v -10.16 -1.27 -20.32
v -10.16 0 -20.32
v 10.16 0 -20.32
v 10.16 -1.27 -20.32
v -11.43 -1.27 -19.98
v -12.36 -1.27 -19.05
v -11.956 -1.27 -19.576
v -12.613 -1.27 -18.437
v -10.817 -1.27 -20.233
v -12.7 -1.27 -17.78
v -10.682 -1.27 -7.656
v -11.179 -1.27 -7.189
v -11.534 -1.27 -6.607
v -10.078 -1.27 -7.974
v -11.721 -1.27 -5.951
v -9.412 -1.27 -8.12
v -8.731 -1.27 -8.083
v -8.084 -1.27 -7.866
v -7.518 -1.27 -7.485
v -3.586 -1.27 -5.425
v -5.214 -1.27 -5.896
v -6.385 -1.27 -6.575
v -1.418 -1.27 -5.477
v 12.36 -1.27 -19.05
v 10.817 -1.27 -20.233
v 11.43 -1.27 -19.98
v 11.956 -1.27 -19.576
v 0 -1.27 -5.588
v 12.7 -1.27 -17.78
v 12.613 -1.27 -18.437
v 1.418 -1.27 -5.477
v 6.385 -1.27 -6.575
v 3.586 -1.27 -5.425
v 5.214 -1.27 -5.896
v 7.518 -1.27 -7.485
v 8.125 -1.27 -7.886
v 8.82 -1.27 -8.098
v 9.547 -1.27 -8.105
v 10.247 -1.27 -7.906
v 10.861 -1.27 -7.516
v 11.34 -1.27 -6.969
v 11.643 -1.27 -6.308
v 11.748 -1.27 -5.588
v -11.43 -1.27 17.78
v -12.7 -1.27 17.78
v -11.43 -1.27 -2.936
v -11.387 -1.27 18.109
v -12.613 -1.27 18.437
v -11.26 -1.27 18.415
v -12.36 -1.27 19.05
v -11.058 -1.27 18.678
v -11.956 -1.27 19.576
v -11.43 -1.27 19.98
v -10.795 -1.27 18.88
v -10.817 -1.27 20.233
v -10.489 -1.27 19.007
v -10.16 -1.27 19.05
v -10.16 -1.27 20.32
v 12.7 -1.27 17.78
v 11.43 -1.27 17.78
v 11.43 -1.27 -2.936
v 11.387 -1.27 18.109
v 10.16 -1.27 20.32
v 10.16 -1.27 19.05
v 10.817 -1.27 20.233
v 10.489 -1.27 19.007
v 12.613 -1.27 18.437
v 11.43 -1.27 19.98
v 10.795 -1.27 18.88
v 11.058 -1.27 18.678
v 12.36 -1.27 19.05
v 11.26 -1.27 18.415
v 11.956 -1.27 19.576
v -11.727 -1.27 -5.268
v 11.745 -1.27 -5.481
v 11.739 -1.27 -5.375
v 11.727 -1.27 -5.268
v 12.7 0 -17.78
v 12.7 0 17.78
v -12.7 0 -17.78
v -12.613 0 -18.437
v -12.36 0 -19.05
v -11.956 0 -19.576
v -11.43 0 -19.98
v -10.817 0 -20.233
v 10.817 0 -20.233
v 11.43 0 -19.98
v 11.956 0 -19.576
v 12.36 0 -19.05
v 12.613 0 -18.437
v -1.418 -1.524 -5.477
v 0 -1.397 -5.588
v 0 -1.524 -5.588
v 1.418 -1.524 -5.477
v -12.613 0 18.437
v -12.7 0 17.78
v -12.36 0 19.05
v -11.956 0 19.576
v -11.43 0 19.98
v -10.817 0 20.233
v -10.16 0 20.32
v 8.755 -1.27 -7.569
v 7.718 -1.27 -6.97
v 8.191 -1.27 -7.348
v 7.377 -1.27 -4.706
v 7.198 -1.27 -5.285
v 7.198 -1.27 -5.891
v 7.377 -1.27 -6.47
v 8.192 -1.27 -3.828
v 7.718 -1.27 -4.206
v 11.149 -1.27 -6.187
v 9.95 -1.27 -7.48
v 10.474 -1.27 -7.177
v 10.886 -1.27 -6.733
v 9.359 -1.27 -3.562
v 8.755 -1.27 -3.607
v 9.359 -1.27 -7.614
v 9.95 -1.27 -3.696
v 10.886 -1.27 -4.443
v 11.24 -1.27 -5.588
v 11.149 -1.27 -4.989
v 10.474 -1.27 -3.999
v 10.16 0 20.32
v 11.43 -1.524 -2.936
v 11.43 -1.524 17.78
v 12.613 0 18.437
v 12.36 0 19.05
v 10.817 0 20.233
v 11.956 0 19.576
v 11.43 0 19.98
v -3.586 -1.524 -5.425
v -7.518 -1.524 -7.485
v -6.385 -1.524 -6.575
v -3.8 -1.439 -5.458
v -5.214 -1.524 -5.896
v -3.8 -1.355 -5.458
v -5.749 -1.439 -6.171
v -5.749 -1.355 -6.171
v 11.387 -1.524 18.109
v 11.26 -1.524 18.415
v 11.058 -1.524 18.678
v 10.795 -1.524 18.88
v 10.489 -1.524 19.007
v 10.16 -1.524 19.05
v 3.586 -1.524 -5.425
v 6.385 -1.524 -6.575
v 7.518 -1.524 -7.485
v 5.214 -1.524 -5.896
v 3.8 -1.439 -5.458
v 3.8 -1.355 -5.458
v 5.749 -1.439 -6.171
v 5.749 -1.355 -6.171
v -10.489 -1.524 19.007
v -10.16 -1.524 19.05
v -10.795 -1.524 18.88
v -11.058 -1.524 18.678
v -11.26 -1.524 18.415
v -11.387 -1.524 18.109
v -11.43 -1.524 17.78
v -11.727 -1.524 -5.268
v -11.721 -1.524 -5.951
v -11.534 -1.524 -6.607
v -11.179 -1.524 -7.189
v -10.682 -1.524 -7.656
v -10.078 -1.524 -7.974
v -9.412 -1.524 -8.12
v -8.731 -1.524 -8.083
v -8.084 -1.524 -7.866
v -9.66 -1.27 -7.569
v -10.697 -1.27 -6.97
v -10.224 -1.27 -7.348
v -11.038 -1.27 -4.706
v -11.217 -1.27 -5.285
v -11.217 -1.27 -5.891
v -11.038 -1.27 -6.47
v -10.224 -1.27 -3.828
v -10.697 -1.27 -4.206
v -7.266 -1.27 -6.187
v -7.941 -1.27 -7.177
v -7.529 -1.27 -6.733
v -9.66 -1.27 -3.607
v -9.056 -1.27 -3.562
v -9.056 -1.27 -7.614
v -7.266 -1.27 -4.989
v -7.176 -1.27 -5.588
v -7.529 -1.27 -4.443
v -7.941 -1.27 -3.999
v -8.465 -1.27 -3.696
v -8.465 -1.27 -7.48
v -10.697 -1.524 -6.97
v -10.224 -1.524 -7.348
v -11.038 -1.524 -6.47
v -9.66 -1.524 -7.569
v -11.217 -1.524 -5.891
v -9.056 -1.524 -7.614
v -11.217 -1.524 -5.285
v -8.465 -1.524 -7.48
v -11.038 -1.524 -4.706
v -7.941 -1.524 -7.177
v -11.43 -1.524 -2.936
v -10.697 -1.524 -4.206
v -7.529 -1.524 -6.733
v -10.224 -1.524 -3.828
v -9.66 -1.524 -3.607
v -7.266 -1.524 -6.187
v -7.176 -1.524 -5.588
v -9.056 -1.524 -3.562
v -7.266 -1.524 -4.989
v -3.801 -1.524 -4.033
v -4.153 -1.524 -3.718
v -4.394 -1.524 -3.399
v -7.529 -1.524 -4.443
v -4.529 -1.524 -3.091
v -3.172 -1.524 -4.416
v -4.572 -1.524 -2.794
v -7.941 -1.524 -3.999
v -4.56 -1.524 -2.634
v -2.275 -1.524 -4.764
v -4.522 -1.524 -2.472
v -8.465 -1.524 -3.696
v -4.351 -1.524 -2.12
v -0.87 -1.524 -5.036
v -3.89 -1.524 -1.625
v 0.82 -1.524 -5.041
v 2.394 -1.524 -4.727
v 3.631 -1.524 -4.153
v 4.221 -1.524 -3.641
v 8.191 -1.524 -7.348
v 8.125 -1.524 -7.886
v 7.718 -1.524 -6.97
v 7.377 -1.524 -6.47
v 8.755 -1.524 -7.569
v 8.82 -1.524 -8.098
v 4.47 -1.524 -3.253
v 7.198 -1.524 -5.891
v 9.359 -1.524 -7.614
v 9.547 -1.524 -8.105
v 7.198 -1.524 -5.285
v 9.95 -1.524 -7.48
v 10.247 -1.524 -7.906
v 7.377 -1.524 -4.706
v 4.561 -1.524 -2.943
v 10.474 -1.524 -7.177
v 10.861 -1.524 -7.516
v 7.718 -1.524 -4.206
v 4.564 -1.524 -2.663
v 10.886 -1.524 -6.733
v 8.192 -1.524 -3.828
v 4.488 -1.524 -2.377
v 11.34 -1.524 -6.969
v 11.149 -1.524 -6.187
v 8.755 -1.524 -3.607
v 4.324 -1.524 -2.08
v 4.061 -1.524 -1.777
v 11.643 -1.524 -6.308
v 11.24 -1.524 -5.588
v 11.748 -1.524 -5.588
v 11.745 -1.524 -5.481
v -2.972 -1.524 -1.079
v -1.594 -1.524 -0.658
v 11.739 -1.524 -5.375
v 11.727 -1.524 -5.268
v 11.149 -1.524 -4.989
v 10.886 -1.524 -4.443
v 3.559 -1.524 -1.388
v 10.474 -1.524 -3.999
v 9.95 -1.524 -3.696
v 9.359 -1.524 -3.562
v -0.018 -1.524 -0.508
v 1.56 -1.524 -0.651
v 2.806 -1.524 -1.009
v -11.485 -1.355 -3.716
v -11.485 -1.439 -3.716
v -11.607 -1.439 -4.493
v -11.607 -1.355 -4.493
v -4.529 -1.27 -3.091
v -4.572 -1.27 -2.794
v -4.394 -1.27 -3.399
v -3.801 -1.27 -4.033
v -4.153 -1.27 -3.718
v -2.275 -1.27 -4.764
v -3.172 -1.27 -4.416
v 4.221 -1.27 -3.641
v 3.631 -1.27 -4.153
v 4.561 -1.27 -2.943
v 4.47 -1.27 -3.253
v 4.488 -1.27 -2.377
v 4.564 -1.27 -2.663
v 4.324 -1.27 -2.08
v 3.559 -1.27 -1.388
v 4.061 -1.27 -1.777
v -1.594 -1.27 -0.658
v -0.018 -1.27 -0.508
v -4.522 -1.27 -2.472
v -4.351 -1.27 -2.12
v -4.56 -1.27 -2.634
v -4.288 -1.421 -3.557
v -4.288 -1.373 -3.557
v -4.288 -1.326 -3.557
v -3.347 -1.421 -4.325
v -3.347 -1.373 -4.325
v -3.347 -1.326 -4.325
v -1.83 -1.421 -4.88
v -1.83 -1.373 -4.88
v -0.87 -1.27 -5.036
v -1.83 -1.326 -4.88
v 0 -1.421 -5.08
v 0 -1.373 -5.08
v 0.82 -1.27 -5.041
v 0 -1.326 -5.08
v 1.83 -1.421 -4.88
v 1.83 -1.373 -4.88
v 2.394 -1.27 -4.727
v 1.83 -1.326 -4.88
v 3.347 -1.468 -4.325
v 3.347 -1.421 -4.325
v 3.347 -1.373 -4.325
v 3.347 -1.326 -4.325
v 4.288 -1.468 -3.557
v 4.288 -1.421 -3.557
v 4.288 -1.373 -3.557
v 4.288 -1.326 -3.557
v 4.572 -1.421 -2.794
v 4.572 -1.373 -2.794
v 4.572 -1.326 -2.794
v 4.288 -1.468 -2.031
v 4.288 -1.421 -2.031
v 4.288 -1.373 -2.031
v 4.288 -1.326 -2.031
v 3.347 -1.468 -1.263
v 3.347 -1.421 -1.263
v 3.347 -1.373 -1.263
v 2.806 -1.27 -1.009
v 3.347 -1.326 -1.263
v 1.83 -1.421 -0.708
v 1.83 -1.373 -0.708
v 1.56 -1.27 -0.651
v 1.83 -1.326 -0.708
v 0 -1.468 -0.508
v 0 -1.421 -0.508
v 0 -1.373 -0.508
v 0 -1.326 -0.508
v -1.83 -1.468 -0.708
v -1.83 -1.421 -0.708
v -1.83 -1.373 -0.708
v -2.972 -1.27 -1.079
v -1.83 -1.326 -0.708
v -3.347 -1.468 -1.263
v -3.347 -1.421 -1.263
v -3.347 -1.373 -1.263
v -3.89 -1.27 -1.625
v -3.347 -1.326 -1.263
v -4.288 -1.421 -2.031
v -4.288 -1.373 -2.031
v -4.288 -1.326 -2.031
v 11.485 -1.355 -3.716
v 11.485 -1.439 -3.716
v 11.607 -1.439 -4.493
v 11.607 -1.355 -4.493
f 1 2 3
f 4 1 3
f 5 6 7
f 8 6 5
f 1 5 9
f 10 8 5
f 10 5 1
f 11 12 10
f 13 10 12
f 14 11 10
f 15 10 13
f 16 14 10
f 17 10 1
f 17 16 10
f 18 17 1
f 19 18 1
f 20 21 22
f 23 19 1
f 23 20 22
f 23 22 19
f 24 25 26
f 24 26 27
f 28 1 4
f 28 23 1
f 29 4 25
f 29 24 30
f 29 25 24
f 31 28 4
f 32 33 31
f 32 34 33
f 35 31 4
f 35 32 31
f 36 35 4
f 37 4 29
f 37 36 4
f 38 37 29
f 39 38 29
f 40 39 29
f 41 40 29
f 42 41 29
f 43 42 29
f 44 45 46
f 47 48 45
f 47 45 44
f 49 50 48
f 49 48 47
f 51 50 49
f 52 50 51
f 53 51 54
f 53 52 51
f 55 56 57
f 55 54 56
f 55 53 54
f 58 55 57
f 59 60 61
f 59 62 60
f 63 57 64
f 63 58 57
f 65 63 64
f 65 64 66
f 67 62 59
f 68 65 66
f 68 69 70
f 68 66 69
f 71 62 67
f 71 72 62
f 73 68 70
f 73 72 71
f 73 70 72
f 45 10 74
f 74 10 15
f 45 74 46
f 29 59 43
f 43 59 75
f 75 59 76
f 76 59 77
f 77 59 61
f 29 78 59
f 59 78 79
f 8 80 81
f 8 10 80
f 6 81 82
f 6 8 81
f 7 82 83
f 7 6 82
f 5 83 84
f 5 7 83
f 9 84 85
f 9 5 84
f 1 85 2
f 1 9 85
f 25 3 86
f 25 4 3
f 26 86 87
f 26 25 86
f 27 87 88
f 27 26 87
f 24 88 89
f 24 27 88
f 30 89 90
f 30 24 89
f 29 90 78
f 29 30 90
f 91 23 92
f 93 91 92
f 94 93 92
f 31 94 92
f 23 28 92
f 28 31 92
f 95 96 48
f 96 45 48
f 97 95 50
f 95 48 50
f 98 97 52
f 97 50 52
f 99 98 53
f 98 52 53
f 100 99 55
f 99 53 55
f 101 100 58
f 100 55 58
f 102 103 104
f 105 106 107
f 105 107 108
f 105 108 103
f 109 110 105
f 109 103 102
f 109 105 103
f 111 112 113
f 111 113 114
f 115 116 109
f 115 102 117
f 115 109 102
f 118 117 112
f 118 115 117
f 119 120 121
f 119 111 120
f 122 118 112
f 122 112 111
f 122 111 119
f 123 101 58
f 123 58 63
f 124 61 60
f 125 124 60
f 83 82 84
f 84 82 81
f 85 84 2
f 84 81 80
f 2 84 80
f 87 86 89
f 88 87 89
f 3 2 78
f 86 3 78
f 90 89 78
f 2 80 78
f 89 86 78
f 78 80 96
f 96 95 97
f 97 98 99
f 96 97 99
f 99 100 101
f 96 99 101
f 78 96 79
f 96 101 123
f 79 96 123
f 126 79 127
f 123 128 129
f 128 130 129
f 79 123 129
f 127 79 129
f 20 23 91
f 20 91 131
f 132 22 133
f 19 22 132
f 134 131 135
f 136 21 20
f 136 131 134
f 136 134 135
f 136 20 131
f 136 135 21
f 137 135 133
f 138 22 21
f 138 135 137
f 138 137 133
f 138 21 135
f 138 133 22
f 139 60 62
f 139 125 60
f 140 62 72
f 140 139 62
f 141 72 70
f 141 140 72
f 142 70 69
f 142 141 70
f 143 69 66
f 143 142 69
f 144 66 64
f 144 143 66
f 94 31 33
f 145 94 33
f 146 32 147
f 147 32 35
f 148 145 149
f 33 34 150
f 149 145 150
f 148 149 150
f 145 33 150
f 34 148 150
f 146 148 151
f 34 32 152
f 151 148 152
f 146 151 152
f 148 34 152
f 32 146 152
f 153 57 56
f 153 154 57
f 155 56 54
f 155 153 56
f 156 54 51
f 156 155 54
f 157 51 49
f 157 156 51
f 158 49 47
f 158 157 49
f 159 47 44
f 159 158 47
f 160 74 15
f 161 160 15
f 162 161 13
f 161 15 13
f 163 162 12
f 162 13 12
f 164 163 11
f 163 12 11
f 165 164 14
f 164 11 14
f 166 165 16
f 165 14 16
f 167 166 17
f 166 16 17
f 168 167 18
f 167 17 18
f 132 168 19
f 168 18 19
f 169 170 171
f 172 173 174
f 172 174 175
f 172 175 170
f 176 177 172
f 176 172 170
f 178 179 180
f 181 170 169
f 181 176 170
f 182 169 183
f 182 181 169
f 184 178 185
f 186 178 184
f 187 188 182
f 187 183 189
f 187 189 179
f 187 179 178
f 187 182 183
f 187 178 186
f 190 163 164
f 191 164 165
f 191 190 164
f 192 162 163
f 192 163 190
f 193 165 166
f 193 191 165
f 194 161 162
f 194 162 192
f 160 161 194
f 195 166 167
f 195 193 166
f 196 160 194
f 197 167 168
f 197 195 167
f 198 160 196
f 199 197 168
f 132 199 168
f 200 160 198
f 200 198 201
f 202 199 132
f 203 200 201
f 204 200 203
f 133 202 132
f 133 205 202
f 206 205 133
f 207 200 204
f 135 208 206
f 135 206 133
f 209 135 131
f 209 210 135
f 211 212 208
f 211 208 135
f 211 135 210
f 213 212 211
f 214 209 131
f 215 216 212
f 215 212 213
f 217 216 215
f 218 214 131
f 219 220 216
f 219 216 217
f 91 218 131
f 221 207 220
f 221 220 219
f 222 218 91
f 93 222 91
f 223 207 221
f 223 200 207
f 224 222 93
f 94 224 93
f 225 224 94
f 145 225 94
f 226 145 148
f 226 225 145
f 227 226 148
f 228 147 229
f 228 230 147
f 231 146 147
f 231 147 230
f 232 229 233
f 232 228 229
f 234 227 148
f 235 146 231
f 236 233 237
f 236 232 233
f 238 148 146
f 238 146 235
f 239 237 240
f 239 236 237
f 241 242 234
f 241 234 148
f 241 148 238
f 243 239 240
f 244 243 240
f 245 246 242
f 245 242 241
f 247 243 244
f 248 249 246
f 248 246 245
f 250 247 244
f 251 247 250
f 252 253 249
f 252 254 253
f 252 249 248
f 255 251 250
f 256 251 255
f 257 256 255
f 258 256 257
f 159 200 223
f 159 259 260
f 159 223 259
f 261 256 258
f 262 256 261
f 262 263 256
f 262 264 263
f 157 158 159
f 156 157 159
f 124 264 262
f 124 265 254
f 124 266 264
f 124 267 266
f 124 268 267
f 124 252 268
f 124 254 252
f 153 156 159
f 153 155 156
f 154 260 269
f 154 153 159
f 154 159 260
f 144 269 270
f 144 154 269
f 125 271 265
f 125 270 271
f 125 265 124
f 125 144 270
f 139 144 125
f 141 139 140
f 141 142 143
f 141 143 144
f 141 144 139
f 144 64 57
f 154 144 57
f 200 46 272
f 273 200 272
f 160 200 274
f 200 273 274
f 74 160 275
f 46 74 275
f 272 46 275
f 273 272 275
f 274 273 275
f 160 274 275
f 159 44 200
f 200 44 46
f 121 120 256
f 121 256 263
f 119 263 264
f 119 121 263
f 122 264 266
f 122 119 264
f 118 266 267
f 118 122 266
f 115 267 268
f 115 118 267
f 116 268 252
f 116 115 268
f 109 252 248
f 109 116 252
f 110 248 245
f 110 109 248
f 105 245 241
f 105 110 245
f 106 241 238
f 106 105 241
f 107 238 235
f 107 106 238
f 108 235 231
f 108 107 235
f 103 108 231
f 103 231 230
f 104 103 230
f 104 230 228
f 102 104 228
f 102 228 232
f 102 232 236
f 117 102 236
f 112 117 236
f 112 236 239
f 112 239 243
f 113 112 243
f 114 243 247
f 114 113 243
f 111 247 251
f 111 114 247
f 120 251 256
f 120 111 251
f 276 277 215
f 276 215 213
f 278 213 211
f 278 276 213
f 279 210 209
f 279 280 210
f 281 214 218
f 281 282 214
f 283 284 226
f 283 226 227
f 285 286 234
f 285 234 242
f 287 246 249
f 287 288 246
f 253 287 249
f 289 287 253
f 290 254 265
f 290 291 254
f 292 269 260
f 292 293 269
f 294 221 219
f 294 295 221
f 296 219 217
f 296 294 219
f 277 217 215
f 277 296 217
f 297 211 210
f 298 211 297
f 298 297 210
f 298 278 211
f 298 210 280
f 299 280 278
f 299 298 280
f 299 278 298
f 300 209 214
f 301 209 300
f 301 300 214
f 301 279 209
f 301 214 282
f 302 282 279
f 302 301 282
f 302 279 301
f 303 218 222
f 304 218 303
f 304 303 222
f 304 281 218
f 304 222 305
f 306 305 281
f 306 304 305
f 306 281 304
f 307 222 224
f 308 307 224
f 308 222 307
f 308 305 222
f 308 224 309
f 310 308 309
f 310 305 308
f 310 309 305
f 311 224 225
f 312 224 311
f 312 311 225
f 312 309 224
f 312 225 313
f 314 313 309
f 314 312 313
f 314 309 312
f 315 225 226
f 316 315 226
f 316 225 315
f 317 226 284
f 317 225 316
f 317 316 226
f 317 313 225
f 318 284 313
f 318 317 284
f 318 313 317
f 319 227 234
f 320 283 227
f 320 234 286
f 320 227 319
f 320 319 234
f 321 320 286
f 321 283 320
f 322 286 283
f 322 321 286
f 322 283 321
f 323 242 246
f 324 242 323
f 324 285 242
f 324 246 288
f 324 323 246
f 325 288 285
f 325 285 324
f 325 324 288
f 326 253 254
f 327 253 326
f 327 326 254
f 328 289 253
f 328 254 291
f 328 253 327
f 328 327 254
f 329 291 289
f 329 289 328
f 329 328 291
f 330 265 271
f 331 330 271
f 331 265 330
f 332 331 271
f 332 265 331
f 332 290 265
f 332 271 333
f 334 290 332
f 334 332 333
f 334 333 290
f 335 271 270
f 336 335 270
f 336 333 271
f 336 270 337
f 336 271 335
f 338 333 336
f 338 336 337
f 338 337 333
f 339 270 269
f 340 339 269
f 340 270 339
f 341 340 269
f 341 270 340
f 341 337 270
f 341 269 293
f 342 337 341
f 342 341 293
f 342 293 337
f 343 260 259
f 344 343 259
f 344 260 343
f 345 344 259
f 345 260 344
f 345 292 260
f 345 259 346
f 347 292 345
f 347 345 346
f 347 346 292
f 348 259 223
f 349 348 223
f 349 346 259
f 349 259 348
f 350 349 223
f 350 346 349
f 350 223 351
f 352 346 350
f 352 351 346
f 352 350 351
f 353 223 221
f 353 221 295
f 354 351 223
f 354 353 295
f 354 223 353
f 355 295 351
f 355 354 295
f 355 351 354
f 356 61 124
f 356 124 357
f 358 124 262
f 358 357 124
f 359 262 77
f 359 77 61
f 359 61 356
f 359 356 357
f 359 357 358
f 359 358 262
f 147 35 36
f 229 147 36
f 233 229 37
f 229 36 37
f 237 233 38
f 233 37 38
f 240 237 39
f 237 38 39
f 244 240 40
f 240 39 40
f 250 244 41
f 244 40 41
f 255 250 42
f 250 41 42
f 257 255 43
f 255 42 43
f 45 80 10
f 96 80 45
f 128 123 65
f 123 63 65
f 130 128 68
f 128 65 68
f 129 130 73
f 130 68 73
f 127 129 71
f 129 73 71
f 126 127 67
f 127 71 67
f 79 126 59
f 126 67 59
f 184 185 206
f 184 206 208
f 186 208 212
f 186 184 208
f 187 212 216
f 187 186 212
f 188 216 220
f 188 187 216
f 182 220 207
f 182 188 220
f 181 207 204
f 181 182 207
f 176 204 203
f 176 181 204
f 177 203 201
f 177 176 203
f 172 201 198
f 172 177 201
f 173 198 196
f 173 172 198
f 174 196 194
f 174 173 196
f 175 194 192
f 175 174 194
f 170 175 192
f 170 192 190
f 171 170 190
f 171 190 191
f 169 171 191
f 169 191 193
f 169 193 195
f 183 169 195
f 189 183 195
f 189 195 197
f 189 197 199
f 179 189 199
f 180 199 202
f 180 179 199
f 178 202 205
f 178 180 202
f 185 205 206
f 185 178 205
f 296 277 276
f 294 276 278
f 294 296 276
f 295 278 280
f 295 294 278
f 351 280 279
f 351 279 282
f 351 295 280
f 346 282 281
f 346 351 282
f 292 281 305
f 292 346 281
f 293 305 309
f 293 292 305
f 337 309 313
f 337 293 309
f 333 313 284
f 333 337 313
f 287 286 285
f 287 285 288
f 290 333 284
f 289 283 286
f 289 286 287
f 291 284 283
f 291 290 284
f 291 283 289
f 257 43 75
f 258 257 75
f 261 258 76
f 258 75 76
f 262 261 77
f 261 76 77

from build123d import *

# Parameters (mm, degrees)
F0_W     = 25.4
F0_H     = 40.64
F1_DEPTH = 1.27
F2_R     = 2.032
F3_DEPTH = 0.254
F4_R     = 2.54
F5_R     = 1.27


# Not quite as in the source:
# - the dataset's text gives a spline's control points without its knots; the knots are read off the source's solid


with BuildPart() as f1:
    # F0 (on Front) → F1 (new body)
    with BuildSketch(Plane.XZ):
        Rectangle(F0_W, F0_H)
    extrude(amount=F1_DEPTH)

    # F2 (on face) → F3 (join)
    with BuildSketch(Plane.XZ.offset(1.27)):
        with BuildLine():
            ThreePointArc((-7.5180080999, -7.4846331009), (-6.8898600985, -6.6273003834), (-6.6675, -5.588))
            ThreePointArc((-6.6675, -5.588), (-9.0473495717, -3.0530538782), (-11.7273045987, -5.268336451))
            ThreePointArc((-11.7273045987, -5.268336451), (-10.3908627949, -7.8354991648), (-7.5180080999, -7.4846331009))
        make_face()
        with Locations((-9.2075, -5.588)):
            Circle(F2_R, mode=Mode.SUBTRACT)
        with BuildLine():
            ThreePointArc((-11.7273045987, -5.268336451), (-9.0473495717, -3.0530538782), (-6.6675, -5.588))
            ThreePointArc((-6.6675, -5.588), (-6.8898600985, -6.6273003834), (-7.5180080999, -7.4846331009))
            add(Edge.make_bspline(
                [(-1.4182194217, -5.4769095653), (-4.1012740694, -5.0478749908), (-5.7548377663, -5.9140278026), (-7.5180080999, -7.4846331009)],
                knots=[0, 0, 0, 0, 6.4217112762, 6.4217112762, 6.4217112762, 6.4217112762], degree=3))
            add(Edge.make_bspline(
                [(-5.08, -2.794), (-5.08, -4.8913715579), (-1.4182194217, -5.4769095653)],
                knots=[3.1415926536, 3.1415926536, 3.1415926536, 4.4294520022, 4.4294520022, 4.4294520022], degree=2, weights=[1, 0.7997427872, 1]))
            add(Edge.make_bspline(
                [(5.08, -2.794), (5.08, 0), (0, 0), (-5.08, 0), (-5.08, -2.794)],
                knots=[0, 0, 0, 1.5707963268, 1.5707963268, 3.1415926536, 3.1415926536, 3.1415926536], degree=2, weights=[1, 0.7071067812, 1, 0.7071067812, 1]))
            add(Edge.make_bspline(
                [(1.4182194217, -5.4769095653), (5.08, -4.8913715579), (5.08, -2.794)],
                knots=[4.9953259586, 4.9953259586, 4.9953259586, 6.2831853072, 6.2831853072, 6.2831853072], degree=2, weights=[1, 0.7997427872, 1]))
            add(Edge.make_bspline(
                [(1.4182194217, -5.4769095653), (4.1012740694, -5.0478749908), (5.7548377663, -5.9140278026), (7.5180080999, -7.4846331009)],
                knots=[0, 0, 0, 0, 6.4217112762, 6.4217112762, 6.4217112762, 6.4217112762], degree=3))
            ThreePointArc((7.5180080999, -7.4846331009), (8.0241372051, -3.3405008352), (11.7273045987, -5.268336451))
            add(Edge.make_bspline(
                [(11.43, -2.9357403982), (11.43, -3.7171181073), (11.6289668146, -4.4931714335), (11.7273045987, -5.268336451)],
                knots=[0, 0, 0, 0, 2.3514664297, 2.3514664297, 2.3514664297, 2.3514664297], degree=3))
            Line((11.43, -2.9357403982), (11.43, 19.05))
            Line((11.43, 19.05), (-11.43, 19.05))
            Line((-11.43, 19.05), (-11.43, -2.9357403982))
            add(Edge.make_bspline(
                [(-11.43, -2.9357403982), (-11.43, -3.7171181073), (-11.6289668146, -4.4931714335), (-11.7273045987, -5.268336451)],
                knots=[0, 0, 0, 0, 2.3514664297, 2.3514664297, 2.3514664297, 2.3514664297], degree=3))
        make_face()
        with BuildLine():
            add(Edge.make_bspline(
                [(-5.08, -2.794), (-5.08, -4.8913715579), (-1.4182194217, -5.4769095653)],
                knots=[3.1415926536, 3.1415926536, 3.1415926536, 4.4294520022, 4.4294520022, 4.4294520022], degree=2, weights=[1, 0.7997427872, 1]))
            add(Edge.make_bspline(
                [(-1.4182194217, -5.4769095653), (0, -5.7036903231), (1.4182194217, -5.4769095653)],
                knots=[4.4294520022, 4.4294520022, 4.4294520022, 4.9953259586, 4.9953259586, 4.9953259586], degree=2, weights=[1, 0.960239644, 1]))
            add(Edge.make_bspline(
                [(1.4182194217, -5.4769095653), (5.08, -4.8913715579), (5.08, -2.794)],
                knots=[4.9953259586, 4.9953259586, 4.9953259586, 6.2831853072, 6.2831853072, 6.2831853072], degree=2, weights=[1, 0.7997427872, 1]))
            add(Edge.make_bspline(
                [(5.08, -2.794), (5.08, 0), (0, 0), (-5.08, 0), (-5.08, -2.794)],
                knots=[0, 0, 0, 1.5707963268, 1.5707963268, 3.1415926536, 3.1415926536, 3.1415926536], degree=2, weights=[1, 0.7071067812, 1, 0.7071067812, 1]))
        make_face()
        with BuildLine():
            add(Edge.make_bspline(
                [(-4.572, -2.794), (-4.572, -2.9169028513), (-4.5290705478, -3.1627085538), (-4.3175460933, -3.5550013791), (-3.9283471819, -3.9595979757), (-3.3716681218, -4.3337764728), (-2.6686840163, -4.6525156626), (-1.8416721788, -4.8959053951), (-0.9445084224, -5.0455757275), (0, -5.0972121363), (0.9445084224, -5.0455757275), (1.8416721788, -4.8959053951), (2.6686840163, -4.6525156626), (3.3716681218, -4.3337764728), (3.9283471819, -3.9595979757), (4.3175460933, -3.5550013791), (4.5290705478, -3.1627085538), (4.5934647261, -2.794), (4.5290705478, -2.4252914462), (4.3175460933, -2.0329986209), (3.9283471819, -1.6284020243), (3.3716681218, -1.2542235272), (2.6686840163, -0.9354843374), (1.8416721788, -0.6920946049), (0.9445084224, -0.5424242725), (0, -0.4907878637), (-0.9445084224, -0.5424242725), (-1.8416721788, -0.6920946049), (-2.6686840163, -0.9354843374), (-3.3716681218, -1.2542235272), (-3.9283471819, -1.6284020243), (-4.3175460933, -2.0329986209), (-4.5290705478, -2.4252914462), (-4.572, -2.6710971487), (-4.572, -2.794)],
                knots=[0, 0, 0, 0, 0.03125, 0.0625, 0.09375, 0.125, 0.15625, 0.1875, 0.21875, 0.25, 0.28125, 0.3125, 0.34375, 0.375, 0.40625, 0.4375, 0.46875, 0.5, 0.53125, 0.5625, 0.59375, 0.625, 0.65625, 0.6875, 0.71875, 0.75, 0.78125, 0.8125, 0.84375, 0.875, 0.90625, 0.9375, 0.96875, 1, 1, 1, 1], degree=3))
        make_face(mode=Mode.SUBTRACT)
        with BuildLine():
            ThreePointArc((11.7273045987, -5.268336451), (8.0241372051, -3.3405008352), (7.5180080999, -7.4846331009))
            ThreePointArc((7.5180080999, -7.4846331009), (10.2468003834, -7.9056399015), (11.7475, -5.588))
            ThreePointArc((11.7475, -5.588), (11.7424461218, -5.4278495717), (11.7273045987, -5.268336451))
        make_face()
        with Locations((9.2075, -5.588)):
            Circle(F2_R, mode=Mode.SUBTRACT)
    extrude(amount=F3_DEPTH)

    # F4
    f4_edges = [f1.edges().sort_by_distance(p)[0] for p in [
        (12.7, -0.635, -20.32),
        (-12.7, -0.635, -20.32),
        (-12.7, -0.635, 20.32),
        (12.7, -0.635, 20.32),
    ]]
    fillet(f4_edges, radius=F4_R)

    # F5
    f5_edges = [f1.edges().sort_by_distance(p)[0] for p in [
        (-11.43, -1.397, 19.05),
        (11.43, -1.397, 19.05),
    ]]
    fillet(f5_edges, radius=F5_R)


solid = f1.part
